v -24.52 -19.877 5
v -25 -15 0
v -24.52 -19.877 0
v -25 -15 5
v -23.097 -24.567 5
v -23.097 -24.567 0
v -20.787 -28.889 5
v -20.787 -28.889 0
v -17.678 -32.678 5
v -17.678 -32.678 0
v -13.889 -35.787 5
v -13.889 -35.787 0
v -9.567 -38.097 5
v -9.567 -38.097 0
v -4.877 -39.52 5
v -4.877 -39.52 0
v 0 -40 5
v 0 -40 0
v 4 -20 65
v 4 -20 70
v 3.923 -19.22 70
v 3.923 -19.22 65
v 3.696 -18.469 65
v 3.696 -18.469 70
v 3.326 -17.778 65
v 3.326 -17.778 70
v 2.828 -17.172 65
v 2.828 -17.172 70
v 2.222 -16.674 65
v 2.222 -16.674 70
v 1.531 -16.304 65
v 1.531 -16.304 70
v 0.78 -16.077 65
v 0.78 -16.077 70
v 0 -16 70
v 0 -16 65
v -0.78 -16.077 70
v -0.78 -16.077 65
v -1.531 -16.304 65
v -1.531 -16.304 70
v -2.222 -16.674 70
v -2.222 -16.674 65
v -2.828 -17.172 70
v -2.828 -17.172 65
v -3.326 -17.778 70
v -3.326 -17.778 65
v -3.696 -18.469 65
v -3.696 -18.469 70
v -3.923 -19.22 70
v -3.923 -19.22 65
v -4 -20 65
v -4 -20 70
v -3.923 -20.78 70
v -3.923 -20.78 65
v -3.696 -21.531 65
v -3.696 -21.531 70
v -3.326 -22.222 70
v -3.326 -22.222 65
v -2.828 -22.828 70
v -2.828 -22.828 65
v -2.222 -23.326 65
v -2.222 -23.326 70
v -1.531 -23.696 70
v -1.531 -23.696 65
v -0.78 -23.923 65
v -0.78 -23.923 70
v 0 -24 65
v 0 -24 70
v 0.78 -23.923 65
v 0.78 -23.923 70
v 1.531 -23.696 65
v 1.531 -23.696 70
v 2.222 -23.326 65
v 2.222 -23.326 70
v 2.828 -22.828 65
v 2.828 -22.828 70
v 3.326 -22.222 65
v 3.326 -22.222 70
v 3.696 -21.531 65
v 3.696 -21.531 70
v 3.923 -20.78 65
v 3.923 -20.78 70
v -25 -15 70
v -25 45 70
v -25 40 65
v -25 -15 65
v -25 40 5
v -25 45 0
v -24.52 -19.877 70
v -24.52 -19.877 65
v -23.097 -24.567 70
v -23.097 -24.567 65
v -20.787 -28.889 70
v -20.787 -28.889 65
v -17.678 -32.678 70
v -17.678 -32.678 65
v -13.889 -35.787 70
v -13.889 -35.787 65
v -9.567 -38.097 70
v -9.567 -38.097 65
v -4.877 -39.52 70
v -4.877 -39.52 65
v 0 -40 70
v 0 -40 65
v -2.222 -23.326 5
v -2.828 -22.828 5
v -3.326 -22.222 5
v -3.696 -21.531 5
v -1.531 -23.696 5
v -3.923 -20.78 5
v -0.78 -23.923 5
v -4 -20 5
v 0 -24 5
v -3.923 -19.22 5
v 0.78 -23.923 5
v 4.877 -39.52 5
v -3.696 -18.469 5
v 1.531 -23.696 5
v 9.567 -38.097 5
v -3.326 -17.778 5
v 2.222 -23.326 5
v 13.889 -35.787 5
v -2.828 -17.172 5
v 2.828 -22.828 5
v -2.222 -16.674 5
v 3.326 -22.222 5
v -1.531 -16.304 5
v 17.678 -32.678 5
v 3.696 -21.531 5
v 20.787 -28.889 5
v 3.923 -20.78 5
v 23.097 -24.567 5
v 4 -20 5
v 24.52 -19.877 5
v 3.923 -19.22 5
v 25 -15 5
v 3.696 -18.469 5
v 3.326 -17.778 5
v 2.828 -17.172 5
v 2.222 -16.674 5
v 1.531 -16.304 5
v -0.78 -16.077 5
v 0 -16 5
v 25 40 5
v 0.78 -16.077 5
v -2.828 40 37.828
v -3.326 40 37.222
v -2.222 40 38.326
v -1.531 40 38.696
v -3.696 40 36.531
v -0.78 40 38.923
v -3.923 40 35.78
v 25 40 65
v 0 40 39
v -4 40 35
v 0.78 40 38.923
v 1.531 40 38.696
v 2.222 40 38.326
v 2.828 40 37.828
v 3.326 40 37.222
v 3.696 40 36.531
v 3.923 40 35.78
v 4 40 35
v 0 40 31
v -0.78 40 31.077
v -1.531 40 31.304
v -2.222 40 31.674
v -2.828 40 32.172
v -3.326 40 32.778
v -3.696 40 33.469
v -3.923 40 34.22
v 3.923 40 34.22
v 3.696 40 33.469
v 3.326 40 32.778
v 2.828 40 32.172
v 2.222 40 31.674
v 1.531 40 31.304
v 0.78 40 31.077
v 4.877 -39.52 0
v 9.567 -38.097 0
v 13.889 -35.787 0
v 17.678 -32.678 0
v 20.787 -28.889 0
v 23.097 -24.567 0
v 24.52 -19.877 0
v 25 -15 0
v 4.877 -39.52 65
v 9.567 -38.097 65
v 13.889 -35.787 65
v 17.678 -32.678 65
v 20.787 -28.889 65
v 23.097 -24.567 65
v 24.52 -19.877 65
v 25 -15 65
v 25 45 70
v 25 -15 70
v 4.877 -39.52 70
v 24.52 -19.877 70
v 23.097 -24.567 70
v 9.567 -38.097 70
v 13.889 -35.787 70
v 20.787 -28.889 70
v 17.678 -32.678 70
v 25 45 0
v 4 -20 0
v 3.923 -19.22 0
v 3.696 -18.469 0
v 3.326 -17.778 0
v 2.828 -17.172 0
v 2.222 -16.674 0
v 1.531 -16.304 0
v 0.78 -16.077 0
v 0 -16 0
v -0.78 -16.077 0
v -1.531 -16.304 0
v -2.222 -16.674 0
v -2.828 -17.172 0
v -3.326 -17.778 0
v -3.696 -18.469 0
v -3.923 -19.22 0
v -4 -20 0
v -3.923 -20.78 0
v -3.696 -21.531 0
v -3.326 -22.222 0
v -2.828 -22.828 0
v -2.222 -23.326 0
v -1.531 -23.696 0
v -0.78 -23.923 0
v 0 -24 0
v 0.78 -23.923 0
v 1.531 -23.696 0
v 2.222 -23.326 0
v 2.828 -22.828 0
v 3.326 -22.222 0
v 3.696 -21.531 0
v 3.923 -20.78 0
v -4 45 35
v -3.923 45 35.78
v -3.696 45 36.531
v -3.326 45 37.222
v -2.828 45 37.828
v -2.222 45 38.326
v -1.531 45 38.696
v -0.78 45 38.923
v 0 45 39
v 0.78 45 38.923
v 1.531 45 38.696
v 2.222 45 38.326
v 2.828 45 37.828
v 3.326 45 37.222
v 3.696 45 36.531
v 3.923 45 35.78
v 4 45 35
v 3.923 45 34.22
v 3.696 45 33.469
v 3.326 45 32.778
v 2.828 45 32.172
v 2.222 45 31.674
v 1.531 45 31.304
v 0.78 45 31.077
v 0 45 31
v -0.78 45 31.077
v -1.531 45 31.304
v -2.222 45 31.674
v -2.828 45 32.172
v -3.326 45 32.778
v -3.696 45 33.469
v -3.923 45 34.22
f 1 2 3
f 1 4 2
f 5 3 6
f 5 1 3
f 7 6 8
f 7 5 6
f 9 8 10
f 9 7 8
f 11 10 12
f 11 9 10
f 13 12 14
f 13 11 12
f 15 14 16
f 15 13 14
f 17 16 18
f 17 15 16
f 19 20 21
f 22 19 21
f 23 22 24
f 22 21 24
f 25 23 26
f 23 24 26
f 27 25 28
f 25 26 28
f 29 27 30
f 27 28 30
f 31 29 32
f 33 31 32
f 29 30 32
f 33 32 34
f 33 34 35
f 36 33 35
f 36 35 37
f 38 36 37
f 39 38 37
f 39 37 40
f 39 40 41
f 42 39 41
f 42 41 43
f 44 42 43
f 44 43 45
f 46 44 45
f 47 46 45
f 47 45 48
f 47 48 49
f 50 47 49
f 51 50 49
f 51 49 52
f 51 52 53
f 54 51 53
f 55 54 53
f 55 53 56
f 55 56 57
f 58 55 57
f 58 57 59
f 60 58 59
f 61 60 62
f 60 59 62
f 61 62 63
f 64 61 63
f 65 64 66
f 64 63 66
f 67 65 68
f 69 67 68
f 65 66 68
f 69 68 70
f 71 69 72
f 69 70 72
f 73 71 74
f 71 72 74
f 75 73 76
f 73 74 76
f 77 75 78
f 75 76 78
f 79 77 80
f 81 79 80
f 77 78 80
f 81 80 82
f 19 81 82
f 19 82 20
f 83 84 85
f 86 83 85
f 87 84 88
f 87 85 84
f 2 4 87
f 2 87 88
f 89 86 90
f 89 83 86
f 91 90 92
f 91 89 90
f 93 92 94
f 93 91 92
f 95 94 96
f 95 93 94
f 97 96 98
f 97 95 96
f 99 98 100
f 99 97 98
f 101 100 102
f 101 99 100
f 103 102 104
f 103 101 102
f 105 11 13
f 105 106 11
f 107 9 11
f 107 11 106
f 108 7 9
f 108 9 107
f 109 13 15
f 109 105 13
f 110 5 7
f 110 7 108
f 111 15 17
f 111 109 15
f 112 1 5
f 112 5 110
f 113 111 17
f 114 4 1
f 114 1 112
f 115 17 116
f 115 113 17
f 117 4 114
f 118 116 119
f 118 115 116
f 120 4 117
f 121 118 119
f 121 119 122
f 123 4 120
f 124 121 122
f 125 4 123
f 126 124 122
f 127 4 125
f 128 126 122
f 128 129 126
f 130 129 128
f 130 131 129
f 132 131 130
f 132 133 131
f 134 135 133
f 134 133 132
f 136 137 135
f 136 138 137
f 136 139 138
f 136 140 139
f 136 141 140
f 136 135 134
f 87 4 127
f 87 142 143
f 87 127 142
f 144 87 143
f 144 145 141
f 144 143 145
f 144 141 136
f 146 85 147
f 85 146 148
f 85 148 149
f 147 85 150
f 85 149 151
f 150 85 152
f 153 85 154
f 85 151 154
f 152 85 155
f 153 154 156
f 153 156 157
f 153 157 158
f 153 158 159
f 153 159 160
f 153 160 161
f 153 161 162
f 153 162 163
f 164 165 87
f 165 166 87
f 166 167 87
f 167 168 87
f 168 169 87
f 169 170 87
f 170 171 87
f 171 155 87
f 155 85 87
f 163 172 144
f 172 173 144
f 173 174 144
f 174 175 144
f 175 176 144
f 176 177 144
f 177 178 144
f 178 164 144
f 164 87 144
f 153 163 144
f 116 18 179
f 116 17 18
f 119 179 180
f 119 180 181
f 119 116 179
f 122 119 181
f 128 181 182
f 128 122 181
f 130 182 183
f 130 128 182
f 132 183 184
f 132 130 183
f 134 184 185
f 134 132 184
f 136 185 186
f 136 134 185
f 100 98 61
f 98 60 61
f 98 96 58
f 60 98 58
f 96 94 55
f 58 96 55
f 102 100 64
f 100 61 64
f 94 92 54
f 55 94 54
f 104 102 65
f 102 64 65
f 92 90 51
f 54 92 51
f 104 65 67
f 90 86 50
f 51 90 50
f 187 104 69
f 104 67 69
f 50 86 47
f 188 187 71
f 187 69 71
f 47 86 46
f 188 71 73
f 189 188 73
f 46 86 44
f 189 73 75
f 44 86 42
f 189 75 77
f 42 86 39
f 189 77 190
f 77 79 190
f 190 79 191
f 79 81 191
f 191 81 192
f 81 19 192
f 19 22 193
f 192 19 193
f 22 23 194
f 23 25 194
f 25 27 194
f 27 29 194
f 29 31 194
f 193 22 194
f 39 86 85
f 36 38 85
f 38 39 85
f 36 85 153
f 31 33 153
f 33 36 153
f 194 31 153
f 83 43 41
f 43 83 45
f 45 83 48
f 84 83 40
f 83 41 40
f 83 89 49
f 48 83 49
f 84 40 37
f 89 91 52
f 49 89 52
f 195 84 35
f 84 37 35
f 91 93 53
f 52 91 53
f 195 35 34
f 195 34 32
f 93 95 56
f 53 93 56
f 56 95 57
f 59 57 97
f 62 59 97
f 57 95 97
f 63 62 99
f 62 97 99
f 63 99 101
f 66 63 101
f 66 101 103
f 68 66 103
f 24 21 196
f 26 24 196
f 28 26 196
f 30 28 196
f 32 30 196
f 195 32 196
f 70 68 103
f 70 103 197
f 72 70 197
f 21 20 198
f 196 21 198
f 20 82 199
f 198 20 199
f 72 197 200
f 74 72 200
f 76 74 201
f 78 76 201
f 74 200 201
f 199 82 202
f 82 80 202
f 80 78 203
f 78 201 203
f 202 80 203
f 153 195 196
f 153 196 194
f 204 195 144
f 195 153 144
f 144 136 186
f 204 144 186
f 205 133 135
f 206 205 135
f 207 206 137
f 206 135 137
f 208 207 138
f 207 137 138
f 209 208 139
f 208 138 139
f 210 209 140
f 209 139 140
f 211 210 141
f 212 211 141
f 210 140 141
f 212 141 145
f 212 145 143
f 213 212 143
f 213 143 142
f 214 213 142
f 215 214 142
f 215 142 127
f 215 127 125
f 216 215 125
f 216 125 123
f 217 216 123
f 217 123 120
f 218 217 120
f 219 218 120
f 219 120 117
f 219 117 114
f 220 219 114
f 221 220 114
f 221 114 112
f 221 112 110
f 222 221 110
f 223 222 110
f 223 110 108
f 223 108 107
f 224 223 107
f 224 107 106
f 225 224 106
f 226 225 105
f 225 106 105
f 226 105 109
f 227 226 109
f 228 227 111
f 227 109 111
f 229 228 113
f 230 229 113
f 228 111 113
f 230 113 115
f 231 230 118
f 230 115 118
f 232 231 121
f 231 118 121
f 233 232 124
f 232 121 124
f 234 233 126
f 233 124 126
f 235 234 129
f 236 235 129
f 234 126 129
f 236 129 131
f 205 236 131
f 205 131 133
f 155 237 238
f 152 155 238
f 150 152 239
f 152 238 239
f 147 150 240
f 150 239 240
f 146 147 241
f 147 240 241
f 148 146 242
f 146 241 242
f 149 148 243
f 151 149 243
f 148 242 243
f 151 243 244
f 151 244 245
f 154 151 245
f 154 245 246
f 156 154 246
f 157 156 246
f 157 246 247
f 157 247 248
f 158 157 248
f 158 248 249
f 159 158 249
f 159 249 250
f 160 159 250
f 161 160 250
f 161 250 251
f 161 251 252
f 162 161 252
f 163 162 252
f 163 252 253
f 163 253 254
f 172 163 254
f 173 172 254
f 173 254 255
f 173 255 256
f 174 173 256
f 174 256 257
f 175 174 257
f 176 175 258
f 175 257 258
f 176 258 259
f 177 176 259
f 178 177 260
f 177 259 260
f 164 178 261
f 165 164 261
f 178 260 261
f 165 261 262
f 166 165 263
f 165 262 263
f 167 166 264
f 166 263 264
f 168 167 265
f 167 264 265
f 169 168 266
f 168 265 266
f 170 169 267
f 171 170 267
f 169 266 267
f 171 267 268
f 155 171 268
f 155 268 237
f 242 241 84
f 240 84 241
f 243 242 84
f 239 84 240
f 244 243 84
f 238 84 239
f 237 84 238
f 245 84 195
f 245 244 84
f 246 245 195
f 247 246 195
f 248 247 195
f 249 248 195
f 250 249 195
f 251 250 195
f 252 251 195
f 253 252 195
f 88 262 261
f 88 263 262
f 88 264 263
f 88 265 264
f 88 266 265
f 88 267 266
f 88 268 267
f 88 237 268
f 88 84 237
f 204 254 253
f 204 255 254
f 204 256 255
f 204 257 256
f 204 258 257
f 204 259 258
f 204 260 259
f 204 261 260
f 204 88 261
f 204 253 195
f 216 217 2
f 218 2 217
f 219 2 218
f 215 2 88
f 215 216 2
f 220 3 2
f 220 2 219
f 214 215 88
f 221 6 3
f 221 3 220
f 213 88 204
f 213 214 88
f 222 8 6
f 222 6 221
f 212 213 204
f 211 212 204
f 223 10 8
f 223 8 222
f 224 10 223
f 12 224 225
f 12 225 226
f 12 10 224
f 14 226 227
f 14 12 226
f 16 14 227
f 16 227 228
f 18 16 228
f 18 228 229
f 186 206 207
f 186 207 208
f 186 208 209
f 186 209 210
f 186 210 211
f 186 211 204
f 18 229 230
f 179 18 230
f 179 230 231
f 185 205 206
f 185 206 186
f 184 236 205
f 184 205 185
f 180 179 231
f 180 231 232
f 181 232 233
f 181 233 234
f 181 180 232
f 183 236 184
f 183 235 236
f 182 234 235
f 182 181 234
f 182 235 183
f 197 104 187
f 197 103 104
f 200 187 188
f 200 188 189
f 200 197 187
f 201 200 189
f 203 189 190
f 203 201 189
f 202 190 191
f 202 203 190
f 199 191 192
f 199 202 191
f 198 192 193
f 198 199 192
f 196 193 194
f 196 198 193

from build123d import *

# Parameters (mm, degrees)
SKETCH_1_W          = 50
SKETCH_1_H          = 80
EXTRUDE_1_DEPTH     = 5
SKETCH_2_W          = 50
SKETCH_2_H          = 80
EXTRUDE_2_DEPTH     = 5
SKETCH_3_W          = 50
SKETCH_3_H          = 70
EXTRUDE_3_DEPTH     = 5
SKETCH_4_R          = 4
CUT_EXTRUDE_1_DEPTH = 87.890735985
SKETCH_5_R          = 4
CUT_EXTRUDE_2_DEPTH = 113.915897906
FILLET_1_R          = 25


with BuildPart() as part:
    # 草图1 → 凸台-拉伸1 (new body)
    with BuildSketch(Plane.XY):
        Rectangle(SKETCH_1_W, SKETCH_1_H)
    extrude(amount=EXTRUDE_1_DEPTH)



with BuildPart() as body_2:
    # 草图2 → 凸台-拉伸2 (new body)
    with BuildSketch(Plane.XY.offset(65)):
        Rectangle(SKETCH_2_W, SKETCH_2_H)
    extrude(amount=EXTRUDE_2_DEPTH)


with BuildPart() as part_1:
    add(part.part)

    add(body_2.part)  # 凸台-拉伸3 merges body 2
    # 草图3 → 凸台-拉伸3 (add)
    with BuildSketch(Plane(origin=(0, 40, 0), x_dir=(1, 0, 0), z_dir=(0, 1, 0))):
        with Locations((0, -35)):
            Rectangle(SKETCH_3_W, SKETCH_3_H)
    extrude(amount=EXTRUDE_3_DEPTH)

    # 草图4 → 切除-拉伸1 (cut, through all)
    with BuildSketch(Plane.XY.offset(70)):
        with Locations((0, -20)):
            Circle(SKETCH_4_R)
    extrude(amount=-CUT_EXTRUDE_1_DEPTH, mode=Mode.SUBTRACT)

    # 草图5 → 切除-拉伸2 (cut, through all)
    with BuildSketch(Plane(origin=(0, 45, 0), x_dir=(1, 0, 0), z_dir=(0, 1, 0))):
        with Locations(Location((0, -35, 0), (0, 0, 180))):
            Circle(SKETCH_5_R)
    extrude(amount=-CUT_EXTRUDE_2_DEPTH, mode=Mode.SUBTRACT)

    # 圆角1
    fillet_1_edges = [part_1.edges().sort_by_distance(p)[0] for p in [
        (-25, -40, 2.5),
        (25, -40, 2.5),
        (25, -40, 67.5),
        (-25, -40, 67.5),
    ]]
    fillet(fillet_1_edges, radius=FILLET_1_R - 0.0001)  # a hair under: the kernel refuses the full size


solid = part_1.part
